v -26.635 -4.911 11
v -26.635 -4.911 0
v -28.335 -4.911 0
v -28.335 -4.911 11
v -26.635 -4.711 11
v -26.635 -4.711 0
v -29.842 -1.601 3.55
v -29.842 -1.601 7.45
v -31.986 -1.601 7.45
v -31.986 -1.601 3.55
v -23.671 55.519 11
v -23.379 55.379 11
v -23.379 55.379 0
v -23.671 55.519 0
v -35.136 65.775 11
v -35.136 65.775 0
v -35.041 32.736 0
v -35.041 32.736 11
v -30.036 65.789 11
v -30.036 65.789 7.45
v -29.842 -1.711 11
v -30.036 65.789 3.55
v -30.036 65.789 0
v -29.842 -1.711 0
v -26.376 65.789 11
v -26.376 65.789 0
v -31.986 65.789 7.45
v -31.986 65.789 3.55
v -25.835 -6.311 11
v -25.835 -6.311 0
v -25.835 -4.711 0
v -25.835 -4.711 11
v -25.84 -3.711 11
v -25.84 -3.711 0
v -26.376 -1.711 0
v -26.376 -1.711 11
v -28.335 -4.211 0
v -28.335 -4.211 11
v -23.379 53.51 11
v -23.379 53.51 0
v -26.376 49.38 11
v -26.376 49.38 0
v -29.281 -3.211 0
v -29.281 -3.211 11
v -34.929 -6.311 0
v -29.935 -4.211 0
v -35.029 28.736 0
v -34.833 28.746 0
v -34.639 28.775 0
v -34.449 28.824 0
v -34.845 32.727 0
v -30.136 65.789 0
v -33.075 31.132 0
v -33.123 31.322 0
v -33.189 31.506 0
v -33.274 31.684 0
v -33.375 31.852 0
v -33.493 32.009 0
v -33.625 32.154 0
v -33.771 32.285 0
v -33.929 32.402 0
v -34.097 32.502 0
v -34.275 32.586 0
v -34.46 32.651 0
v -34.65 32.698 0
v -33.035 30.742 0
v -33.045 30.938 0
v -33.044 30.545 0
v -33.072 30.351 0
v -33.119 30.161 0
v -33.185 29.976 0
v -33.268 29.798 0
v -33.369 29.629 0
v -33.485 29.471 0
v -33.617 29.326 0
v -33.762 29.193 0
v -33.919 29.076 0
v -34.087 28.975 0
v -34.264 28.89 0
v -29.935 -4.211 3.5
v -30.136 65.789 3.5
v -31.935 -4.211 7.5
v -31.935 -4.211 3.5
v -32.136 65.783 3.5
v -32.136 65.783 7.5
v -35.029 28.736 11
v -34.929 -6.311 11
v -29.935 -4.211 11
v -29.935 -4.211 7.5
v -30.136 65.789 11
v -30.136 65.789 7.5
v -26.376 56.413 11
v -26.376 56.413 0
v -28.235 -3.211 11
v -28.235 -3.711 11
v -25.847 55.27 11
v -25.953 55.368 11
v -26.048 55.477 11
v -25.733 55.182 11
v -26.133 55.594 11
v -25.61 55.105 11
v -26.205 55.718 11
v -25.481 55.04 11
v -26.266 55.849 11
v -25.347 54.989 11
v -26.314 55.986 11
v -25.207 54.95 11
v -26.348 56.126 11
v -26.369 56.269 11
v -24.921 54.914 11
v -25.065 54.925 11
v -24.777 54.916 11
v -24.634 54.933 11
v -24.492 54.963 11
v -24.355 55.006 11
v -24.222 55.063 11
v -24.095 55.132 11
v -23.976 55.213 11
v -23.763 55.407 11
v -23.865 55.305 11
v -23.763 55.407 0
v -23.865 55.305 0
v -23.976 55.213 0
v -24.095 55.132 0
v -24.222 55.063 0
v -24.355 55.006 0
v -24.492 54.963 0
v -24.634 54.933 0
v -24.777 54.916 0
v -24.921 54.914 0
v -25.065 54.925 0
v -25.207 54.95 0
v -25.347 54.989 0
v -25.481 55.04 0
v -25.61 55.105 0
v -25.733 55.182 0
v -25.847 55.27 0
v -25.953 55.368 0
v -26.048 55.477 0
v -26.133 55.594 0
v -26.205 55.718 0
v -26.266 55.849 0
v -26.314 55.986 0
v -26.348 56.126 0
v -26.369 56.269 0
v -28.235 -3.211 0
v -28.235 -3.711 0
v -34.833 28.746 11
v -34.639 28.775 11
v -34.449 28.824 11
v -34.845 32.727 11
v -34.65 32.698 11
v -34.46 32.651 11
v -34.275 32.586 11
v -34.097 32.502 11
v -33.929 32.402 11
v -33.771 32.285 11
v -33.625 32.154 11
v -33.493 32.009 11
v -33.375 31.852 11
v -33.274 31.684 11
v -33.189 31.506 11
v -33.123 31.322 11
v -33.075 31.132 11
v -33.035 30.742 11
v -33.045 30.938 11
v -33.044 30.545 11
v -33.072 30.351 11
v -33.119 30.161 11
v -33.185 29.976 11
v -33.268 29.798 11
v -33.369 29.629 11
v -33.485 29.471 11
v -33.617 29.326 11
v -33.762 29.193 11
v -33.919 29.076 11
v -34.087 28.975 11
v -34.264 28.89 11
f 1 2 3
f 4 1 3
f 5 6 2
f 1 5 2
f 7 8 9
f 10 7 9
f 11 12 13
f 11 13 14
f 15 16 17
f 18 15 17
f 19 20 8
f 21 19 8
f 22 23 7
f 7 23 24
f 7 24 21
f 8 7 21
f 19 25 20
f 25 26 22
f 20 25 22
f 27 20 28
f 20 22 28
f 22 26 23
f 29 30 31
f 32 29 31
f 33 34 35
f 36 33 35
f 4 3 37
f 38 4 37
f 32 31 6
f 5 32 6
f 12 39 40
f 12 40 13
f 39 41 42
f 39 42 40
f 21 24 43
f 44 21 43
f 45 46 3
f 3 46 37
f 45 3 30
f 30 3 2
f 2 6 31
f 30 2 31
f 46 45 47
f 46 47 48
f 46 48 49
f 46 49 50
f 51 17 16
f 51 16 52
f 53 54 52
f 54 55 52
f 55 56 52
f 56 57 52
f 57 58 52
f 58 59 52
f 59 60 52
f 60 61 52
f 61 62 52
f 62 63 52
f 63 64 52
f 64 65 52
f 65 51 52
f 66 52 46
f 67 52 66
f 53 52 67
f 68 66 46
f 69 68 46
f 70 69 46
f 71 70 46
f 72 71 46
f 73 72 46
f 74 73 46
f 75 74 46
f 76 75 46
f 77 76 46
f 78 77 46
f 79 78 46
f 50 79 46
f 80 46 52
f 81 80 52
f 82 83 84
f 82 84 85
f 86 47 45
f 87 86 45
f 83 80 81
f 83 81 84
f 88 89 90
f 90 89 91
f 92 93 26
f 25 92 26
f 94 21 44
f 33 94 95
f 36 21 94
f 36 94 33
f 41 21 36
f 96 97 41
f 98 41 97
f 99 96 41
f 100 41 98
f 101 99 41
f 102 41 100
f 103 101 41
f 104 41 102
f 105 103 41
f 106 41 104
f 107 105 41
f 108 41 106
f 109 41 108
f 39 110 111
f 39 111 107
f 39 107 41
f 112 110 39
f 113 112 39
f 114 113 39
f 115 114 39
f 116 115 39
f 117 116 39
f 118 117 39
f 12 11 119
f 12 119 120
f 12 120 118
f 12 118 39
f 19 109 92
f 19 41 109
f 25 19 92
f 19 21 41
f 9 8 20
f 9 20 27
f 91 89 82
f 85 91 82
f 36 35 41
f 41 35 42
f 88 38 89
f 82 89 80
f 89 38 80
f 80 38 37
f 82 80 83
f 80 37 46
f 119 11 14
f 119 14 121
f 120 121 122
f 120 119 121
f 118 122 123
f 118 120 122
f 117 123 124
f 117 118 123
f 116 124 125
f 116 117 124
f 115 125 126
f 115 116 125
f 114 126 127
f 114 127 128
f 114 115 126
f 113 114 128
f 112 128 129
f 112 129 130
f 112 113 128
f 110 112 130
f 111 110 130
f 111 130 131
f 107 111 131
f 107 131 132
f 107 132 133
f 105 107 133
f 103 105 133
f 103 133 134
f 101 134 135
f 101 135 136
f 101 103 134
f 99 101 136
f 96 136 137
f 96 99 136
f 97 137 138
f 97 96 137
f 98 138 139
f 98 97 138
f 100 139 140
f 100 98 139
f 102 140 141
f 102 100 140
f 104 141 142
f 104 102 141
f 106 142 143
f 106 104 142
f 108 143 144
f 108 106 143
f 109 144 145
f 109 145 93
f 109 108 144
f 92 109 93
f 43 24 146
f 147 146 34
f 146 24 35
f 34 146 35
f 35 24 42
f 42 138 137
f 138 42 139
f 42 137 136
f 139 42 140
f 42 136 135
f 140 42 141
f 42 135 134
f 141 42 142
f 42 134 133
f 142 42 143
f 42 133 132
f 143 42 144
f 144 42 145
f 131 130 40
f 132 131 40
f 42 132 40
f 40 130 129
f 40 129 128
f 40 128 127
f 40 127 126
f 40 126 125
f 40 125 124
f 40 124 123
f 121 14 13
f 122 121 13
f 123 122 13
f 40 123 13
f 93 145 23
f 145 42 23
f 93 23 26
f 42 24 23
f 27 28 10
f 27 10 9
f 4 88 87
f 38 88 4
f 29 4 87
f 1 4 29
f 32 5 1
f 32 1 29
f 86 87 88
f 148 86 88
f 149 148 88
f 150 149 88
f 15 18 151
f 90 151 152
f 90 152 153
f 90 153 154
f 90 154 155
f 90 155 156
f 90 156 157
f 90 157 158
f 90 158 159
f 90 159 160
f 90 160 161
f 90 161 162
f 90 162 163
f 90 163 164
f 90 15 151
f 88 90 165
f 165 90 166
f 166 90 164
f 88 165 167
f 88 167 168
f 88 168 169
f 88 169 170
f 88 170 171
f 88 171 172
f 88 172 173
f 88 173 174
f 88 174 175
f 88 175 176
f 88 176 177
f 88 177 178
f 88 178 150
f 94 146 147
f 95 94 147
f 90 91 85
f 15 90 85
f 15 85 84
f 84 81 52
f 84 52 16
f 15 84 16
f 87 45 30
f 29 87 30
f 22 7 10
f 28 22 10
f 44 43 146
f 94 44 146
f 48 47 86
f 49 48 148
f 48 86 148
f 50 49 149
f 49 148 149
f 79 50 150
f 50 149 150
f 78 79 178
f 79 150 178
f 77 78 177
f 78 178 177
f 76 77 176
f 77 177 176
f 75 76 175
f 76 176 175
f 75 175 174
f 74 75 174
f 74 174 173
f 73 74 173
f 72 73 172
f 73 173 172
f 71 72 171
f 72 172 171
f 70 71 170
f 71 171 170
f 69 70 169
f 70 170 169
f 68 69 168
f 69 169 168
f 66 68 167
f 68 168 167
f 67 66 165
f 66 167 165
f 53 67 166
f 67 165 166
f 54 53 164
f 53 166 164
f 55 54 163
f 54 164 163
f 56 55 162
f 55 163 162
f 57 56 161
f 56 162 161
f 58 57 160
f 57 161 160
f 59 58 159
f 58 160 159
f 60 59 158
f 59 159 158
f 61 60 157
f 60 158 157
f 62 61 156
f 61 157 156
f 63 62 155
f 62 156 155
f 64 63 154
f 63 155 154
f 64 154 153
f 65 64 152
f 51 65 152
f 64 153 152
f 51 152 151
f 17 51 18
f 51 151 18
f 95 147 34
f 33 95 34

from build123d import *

# Parameters (mm, degrees)
F1_DEPTH = 11
F2_W     = 4
F2_H     = 4
F3_REACH = 77.7696273196
F4_W     = 3.9
F4_H     = 3.9
F5_DEPTH = 67.39
F6_R     = 2
F7_DEPTH = 25
F9_DEPTH = 11


with BuildPart() as f1:
    # F0 (on Top) → F1 (new body)
    with BuildSketch(Plane.XY):
        Polygon((-25.8345385283, -6.3107501626), (-25.8345385283, -4.7107501626), (-26.6345385283, -4.7107501626), (-26.6345385283, -4.9107501626), (-28.3345385283, -4.9107501626), (-28.3345385283, -4.7107501626), (-28.3345385283, -4.2107501626), (-29.9345385283, -4.2107501626), (-30.1356901966, 65.7889608226), (-35.1356695527, 65.7745928463), (-34.9285245974, -6.3107501626), (-31.0404077172, -6.3107501626), align=None)
    extrude(amount=F1_DEPTH)

    f3_end = Plane(origin=(-29.1345385283, -4.2107501626, 5.5), x_dir=(0, 0, 1), z_dir=(0, 1, 0))
    # F2 (on face) → F3 (cut, up to a plane its end follows)
    with BuildSketch(Plane(origin=(-0.1892989125, 65.875014986, 0), x_dir=(-0.9999958712, -0.0028735953, 0), z_dir=(-0.0028735953, 0.9999958712, 0))):
        with Locations((29.9465149268, 5.5)):
            Rectangle(F2_W, F2_H)
    f3_long = extrude(amount=-F3_REACH, mode=Mode.PRIVATE)
    add(split(f3_long, bisect_by=f3_end, keep=Keep.TOP, mode=Mode.PRIVATE), mode=Mode.SUBTRACT)

    # F6 (on face) → F7 (cut)
    with BuildSketch(Plane.XY.offset(11)):
        with Locations((-35.0349817941, 30.7357882368)):
            Circle(F6_R)
    extrude(amount=-F7_DEPTH, mode=Mode.SUBTRACT)


with BuildPart() as f1b:
    # F0 (on Top) → F1, piece 2 (new body)
    with BuildSketch(Plane.XY):
        Polygon((-28.2345385283, -3.7107501626), (-25.8400786679, -3.7107501626), (-26.3759770527, -1.7107501626), (-26.3759770527, 65.7889608226), (-30.0356901966, 65.7889608226), (-29.8417225461, -1.7107501626), (-29.281405732, -3.2107501626), (-28.2345385283, -3.2107501626), align=None)
    extrude(amount=F1_DEPTH)

    # F4 (on face) → F5 (join)
    with BuildSketch(Plane(origin=(0, 65.7889608226, 0), x_dir=(-1, 0, 0), z_dir=(0, 1, 0))):
        with Locations((30.0356901966, 5.5)):
            Rectangle(F4_W, F4_H)
    extrude(amount=-F5_DEPTH)

    # F8 (on face) → F9 (join, through all)
    with BuildSketch(Plane.XY.offset(11)):
        with BuildLine():
            ThreePointArc((-23.6712550626, 55.5191615881), (-25.3465708344, 54.9885621917), (-26.3759770527, 56.4128309488))
            Line((-26.3759770527, 56.4128309488), (-26.3759770527, 49.3795908988))
            Line((-26.3759770527, 49.3795908988), (-23.3791565106, 53.5104437786))
            Line((-23.3791565106, 53.5104437786), (-23.3791565106, 55.3792828116))
            Line((-23.3791565106, 55.3792828116), (-23.6712550626, 55.5191615881))
        make_face()
    extrude(amount=-F9_DEPTH)


solid = Compound([f1.part, f1b.part])
